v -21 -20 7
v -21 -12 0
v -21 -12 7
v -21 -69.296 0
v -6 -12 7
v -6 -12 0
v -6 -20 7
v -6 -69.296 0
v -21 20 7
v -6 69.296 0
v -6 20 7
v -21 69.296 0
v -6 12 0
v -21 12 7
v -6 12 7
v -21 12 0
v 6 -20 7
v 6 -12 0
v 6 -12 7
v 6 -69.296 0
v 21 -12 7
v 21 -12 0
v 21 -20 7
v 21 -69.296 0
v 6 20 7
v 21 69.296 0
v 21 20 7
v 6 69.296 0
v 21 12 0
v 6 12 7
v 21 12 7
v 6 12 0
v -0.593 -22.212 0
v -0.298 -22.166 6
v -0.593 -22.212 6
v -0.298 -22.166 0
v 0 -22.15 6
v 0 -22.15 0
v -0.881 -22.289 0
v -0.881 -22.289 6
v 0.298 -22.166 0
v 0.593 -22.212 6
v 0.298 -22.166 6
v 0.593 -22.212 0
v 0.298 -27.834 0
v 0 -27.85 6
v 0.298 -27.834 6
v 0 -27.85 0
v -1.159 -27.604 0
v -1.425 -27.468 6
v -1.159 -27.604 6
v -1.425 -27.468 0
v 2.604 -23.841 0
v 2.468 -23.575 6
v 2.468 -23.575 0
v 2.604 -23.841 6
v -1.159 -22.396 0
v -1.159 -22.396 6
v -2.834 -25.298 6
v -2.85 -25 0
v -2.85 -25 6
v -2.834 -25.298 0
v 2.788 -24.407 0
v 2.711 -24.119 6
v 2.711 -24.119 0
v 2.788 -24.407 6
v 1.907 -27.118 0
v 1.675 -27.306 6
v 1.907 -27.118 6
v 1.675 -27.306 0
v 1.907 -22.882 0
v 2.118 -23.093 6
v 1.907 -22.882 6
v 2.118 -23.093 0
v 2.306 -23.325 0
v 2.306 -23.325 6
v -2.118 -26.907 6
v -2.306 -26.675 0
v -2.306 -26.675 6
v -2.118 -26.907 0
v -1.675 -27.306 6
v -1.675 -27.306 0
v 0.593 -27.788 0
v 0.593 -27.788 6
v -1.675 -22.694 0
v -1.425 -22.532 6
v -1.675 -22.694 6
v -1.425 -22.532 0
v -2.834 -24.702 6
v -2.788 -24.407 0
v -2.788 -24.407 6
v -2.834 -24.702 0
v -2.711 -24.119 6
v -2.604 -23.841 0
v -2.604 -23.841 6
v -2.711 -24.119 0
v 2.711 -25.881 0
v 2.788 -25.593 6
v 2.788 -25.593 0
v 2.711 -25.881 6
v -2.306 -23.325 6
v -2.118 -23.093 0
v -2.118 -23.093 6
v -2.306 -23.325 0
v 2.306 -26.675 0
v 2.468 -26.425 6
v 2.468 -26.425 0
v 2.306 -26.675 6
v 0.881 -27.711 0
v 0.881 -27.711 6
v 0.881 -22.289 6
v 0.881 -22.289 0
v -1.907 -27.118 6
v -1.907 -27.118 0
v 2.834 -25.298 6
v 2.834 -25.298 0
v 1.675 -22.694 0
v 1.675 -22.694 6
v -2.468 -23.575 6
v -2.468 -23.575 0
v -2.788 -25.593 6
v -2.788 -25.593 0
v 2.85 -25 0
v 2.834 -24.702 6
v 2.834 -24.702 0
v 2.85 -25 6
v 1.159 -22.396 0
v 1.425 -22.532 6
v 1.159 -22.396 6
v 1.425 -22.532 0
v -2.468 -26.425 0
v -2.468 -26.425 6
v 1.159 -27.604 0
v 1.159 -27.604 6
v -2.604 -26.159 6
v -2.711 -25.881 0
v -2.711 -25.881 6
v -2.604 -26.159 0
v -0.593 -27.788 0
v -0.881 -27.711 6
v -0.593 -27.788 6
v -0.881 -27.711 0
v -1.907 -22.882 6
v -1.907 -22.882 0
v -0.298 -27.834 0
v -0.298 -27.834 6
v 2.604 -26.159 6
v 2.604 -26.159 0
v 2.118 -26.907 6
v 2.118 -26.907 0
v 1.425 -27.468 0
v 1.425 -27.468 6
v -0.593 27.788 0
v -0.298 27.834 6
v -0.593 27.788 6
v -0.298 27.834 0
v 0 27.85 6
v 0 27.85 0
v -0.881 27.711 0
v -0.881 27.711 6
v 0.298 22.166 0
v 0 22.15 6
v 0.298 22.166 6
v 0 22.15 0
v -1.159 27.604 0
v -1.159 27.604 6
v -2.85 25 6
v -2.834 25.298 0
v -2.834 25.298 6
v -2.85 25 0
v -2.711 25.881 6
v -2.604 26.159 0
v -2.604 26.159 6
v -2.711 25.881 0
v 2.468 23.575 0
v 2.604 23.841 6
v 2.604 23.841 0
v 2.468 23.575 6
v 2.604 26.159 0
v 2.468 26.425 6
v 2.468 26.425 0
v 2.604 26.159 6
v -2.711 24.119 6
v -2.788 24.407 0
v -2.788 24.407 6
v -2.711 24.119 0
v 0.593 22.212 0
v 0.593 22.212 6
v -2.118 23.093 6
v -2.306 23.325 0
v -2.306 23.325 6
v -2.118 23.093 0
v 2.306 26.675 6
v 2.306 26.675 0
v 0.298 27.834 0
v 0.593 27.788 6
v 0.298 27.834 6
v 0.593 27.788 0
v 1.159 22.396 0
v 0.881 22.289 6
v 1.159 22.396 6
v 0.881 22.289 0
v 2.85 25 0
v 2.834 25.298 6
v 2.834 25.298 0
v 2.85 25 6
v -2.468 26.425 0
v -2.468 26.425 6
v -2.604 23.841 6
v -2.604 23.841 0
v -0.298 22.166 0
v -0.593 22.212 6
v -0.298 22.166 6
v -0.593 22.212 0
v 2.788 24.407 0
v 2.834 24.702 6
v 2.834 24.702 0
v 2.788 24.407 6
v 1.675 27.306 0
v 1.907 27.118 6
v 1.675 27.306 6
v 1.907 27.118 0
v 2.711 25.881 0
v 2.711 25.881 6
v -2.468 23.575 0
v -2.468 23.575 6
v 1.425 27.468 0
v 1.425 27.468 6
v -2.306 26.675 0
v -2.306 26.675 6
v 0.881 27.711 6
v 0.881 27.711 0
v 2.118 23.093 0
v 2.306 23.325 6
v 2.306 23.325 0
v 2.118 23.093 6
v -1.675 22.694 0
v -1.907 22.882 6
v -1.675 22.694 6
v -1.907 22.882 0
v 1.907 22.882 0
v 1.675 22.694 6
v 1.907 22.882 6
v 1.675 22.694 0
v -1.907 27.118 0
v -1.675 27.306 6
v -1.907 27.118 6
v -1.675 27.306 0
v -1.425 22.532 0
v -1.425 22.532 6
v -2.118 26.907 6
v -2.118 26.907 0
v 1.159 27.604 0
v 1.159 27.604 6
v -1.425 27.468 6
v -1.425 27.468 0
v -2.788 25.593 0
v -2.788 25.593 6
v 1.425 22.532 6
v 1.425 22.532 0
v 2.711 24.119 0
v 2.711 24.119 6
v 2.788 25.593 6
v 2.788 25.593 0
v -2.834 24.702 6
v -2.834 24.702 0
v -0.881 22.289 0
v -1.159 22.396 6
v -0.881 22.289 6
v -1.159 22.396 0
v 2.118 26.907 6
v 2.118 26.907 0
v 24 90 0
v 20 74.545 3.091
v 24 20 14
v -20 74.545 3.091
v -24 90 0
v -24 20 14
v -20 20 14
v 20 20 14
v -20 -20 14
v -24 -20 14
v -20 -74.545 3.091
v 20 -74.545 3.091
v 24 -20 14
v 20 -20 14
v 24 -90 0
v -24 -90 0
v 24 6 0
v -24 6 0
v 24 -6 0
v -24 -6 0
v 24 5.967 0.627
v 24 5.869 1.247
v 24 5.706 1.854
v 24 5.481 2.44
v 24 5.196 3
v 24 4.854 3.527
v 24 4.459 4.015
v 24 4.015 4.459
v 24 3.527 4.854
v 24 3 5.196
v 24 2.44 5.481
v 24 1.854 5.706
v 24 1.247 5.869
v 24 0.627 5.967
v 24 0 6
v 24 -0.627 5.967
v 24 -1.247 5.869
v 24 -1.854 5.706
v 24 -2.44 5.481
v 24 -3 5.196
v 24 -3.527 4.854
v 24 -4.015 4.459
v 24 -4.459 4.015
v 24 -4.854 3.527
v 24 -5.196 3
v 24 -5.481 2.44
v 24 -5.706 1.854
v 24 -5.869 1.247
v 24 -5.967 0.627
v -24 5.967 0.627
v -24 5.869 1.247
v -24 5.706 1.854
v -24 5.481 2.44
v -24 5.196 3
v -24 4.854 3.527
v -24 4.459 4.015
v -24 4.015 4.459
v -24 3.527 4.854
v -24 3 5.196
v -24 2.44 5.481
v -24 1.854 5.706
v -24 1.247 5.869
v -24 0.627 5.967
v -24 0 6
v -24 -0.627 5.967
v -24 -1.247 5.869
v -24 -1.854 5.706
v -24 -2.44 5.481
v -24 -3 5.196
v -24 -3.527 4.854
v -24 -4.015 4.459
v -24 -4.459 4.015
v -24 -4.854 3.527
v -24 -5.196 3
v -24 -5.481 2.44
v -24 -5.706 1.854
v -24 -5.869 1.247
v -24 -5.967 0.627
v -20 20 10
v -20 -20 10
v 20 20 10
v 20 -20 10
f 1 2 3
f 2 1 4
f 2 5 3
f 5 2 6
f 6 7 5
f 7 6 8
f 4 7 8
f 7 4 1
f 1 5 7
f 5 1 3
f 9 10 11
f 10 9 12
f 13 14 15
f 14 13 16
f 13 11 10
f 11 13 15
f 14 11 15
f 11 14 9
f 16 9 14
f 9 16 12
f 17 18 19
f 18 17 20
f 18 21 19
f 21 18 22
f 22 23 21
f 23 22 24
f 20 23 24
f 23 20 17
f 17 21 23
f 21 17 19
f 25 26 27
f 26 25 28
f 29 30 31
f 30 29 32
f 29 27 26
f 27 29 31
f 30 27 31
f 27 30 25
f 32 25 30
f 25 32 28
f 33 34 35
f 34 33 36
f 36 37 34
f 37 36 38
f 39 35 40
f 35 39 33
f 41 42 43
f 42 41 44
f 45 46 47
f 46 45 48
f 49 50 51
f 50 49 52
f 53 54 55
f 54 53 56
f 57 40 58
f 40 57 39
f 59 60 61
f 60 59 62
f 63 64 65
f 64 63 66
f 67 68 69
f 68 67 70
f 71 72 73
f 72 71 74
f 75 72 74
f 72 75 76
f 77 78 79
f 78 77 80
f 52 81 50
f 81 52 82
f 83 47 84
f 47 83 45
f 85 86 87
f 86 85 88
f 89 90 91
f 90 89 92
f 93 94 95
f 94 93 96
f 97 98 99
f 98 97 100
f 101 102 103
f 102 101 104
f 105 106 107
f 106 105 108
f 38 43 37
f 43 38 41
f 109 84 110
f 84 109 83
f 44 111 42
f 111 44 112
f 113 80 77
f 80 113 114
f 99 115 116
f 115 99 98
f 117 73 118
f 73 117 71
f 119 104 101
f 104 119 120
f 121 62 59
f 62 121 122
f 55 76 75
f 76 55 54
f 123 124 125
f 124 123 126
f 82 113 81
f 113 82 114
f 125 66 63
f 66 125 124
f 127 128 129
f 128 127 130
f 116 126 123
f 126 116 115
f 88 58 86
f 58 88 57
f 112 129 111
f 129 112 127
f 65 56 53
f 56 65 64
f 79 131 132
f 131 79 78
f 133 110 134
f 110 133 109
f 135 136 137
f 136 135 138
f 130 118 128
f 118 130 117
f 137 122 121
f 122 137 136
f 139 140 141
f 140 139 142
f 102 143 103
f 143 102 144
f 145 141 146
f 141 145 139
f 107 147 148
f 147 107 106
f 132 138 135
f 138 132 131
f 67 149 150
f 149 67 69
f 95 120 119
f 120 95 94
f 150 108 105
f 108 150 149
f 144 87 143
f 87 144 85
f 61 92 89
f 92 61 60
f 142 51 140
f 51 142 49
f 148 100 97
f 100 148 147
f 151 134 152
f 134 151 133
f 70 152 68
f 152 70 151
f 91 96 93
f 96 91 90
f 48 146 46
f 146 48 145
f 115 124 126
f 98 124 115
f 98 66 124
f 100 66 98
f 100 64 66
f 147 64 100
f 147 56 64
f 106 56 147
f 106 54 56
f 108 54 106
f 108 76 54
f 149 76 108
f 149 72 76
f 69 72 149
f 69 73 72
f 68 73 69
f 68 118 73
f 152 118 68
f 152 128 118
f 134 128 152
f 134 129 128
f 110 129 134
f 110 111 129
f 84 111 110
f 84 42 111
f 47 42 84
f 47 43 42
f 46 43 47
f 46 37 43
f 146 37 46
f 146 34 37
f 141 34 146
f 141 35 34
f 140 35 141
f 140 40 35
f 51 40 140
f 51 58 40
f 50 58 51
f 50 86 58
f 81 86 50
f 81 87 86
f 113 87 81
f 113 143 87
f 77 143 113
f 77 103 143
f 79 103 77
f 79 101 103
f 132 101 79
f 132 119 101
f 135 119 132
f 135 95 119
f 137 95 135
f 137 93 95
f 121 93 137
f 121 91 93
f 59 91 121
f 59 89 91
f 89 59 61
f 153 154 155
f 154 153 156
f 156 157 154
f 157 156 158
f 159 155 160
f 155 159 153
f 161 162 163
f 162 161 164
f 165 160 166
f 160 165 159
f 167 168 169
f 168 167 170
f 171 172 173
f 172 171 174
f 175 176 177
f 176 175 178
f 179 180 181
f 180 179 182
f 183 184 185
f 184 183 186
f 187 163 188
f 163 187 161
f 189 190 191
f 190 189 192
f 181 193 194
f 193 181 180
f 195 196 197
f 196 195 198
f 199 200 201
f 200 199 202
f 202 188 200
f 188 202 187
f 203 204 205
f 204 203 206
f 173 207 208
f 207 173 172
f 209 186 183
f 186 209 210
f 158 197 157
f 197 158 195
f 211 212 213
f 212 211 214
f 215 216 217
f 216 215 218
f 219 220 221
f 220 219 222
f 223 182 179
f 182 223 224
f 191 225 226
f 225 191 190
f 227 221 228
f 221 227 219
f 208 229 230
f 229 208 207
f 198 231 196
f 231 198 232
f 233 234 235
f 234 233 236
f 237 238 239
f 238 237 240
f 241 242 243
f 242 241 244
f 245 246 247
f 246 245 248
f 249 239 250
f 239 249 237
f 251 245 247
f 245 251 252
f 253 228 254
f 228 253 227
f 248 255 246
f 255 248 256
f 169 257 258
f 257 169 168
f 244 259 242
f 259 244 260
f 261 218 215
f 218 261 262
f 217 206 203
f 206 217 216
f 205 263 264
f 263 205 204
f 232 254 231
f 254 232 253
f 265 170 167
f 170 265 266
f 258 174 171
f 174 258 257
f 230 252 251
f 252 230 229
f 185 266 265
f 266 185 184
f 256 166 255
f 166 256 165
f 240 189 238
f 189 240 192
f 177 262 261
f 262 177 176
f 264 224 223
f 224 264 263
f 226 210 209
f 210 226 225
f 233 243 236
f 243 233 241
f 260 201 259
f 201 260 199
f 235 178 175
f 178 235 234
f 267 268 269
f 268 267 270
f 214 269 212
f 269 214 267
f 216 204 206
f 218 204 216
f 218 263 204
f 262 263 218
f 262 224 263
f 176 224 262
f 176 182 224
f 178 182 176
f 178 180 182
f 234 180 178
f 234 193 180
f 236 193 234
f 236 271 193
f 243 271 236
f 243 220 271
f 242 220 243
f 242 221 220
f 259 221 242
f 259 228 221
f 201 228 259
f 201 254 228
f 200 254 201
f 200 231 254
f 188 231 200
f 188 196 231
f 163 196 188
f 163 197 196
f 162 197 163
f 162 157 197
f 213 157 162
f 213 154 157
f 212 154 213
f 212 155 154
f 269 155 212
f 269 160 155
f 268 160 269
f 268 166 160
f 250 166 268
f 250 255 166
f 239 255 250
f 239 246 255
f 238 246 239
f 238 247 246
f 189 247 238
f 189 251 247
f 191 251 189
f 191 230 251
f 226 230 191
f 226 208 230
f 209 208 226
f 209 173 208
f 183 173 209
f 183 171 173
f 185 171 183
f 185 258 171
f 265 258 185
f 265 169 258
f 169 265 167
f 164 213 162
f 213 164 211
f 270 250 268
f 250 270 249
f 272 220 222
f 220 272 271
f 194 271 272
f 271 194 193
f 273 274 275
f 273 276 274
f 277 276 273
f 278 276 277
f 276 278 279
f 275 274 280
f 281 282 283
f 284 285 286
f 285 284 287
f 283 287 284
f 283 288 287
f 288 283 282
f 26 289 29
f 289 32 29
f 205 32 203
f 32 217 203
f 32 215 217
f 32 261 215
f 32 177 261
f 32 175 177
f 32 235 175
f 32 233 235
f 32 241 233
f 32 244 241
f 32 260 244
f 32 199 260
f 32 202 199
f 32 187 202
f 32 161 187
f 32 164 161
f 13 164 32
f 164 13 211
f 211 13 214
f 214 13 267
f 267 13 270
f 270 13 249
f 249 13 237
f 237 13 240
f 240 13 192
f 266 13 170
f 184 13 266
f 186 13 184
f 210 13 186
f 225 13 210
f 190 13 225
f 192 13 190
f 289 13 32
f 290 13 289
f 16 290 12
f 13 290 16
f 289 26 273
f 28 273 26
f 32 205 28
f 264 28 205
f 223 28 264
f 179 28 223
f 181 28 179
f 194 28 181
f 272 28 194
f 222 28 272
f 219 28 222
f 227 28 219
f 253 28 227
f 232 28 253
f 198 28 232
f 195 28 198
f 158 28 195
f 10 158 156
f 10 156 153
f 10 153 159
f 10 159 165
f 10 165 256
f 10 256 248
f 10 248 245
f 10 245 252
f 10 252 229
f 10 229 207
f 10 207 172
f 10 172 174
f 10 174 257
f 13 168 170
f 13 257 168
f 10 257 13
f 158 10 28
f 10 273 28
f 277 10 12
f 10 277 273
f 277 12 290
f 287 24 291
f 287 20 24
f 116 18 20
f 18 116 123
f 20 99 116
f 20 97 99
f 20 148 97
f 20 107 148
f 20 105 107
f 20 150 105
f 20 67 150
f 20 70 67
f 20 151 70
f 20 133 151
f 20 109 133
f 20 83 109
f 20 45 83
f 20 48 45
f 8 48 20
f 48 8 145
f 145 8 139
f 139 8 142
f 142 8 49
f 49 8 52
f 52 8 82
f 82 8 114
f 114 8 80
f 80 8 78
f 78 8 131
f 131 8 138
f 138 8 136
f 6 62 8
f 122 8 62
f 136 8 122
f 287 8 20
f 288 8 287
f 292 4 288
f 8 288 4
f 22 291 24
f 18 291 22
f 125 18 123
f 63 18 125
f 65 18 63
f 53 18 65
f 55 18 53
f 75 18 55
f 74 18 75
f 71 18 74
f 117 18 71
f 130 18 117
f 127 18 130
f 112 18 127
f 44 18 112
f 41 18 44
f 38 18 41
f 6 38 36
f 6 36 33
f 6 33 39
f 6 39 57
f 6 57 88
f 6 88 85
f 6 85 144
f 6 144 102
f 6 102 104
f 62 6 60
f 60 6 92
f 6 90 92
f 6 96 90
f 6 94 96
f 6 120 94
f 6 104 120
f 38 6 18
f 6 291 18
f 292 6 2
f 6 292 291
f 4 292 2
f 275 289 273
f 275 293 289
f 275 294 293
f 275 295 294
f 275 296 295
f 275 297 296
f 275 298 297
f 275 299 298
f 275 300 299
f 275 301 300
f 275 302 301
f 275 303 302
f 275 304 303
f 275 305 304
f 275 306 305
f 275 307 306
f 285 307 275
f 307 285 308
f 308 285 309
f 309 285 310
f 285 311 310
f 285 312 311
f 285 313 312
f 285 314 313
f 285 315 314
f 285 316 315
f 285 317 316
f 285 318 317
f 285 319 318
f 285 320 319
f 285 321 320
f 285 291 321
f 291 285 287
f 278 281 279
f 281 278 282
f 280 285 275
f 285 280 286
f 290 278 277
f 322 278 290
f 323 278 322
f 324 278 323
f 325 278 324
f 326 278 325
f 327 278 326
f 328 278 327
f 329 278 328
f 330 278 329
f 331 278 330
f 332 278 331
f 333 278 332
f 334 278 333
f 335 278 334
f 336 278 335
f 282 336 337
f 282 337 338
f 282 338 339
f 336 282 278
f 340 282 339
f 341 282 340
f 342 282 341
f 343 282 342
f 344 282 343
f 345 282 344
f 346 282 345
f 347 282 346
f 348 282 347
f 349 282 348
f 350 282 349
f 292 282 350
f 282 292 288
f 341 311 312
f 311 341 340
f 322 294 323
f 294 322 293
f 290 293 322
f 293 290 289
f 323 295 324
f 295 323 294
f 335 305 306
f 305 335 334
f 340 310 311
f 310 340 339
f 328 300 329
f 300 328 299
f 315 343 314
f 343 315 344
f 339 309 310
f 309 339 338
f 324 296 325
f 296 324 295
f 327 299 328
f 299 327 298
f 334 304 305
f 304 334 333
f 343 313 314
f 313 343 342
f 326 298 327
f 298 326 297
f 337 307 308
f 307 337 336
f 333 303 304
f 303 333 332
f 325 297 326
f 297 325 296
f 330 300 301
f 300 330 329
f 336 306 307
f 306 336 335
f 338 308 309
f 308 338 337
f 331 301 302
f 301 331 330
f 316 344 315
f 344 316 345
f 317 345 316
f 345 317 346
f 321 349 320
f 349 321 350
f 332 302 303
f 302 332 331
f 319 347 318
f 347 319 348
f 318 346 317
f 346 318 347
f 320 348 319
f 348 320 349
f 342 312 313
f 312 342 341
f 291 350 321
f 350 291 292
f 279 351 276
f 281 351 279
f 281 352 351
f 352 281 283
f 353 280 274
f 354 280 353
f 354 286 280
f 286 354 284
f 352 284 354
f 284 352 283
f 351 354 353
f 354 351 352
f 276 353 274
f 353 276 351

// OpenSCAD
// Modular Wind-Up Mini Golf System
// PART 3: Bridge Obstacle

/* [Core Tolerances] */
tile_thickness = 8;
peg_diameter = 5.5; 

$fn = 60; 

// ==========================================
// RENDER SELECTION
// ==========================================
bridge_obstacle();

// ==========================================
// BRIDGE OBSTACLE MODULE
// ==========================================

module bridge_obstacle() {
  // Bridge geometry
  bridge_len = 180;  // Length remains 180mm to maximize slope length
  path_w = 40;       // Path width for the golf ball
  rail_w = 4;        // Width of guard rails on each side
  total_w = path_w + 2 * rail_w; // Total width: 48mm
  deck_h = 10;       // Reduced deck height to 10mm for a incredibly gentle and smooth roll-over!
  rail_h = 4;        // Height of rails above deck surface
  
  // Tolerances
  c_hole = 0.2;      // Tolerance for connector peg holes

  // Reorient the entire assembly so:
  // - The bridge length is along the Y-axis (north-south track flow)
  // - The bridge width is along the X-axis (east-west)
  // - The height goes vertically along the Z-axis
  rotate([90, 0, 90]) {
    difference() {
      // ----------------------------------------------------
      // 1. SOLID BRIDGE FOUNDATION (manifold base)
      // ----------------------------------------------------
      linear_extrude(height=total_w, center=true)
        polygon([
          [-bridge_len/2, 0],
          [-20, deck_h + rail_h],
          [20, deck_h + rail_h],
          [bridge_len/2, 0]
        ]);
      
      // ----------------------------------------------------
      // 2. SUBTRACTIONS & CUTOUTS
      // ----------------------------------------------------
      
      // A. The flat bottom tunnel arch underneath the bridge
      cylinder(h=total_w + 2, r=6, center=true);
      
      // B. The recessed ball rolling path of width path_w
      linear_extrude(height=path_w, center=true)
        polygon([
          [-(bridge_len/2 + 5), 0.5],
          [-20, deck_h],
          [20, deck_h],
          [(bridge_len/2 + 5), 0.5],
          [(bridge_len/2 + 5), deck_h + rail_h + 10],
          [-(bridge_len/2 + 5), deck_h + rail_h + 10]
        ]);
      
      // C. 3D Printing Material Relief Pockets (Hollowed Underside)
      // - Removes unnecessary plastic to save ~50% filament and printing time.
      // - Leaves 3mm thick outer side walls and a 3mm thick walkway floor.
      // - Leaves a solid 12mm central spine (rib) along z = 0 to house the peg holes securely.
      // - No supports needed since the ceiling slopes gently at a printable angle.
      for (z_offset = [-13.5, 13.5]) {
        // Left ramp relief pockets (from x = -70 to x = -12)
        translate([0, 0, z_offset])
          linear_extrude(height=15, center=true)
            polygon([
              [-70, -0.1],
              [-20, deck_h - 3],
              [-12, deck_h - 3],
              [-12, -0.1]
            ]);
        
        // Right ramp relief pockets (from x = 12 to x = 70)
        translate([0, 0, z_offset])
          linear_extrude(height=15, center=true)
            polygon([
              [12, -0.1],
              [12, deck_h - 3],
              [20, deck_h - 3],
              [70, -0.1]
            ]);
      }
      
      // D. Pegboard Connector Holes (on flat bottom along centerline)
      // - Placed at x = -25 and x = 25 in bridge space (translates to y = -25 and y = 25 in tile space)
      // - Fully enclosed by the 12mm central spine, leaving 3.15mm of solid wall on all sides!
      for (x_pos = [-25, 25]) {
        translate([x_pos, -0.1, 0])
          rotate([-90, 0, 0])
            cylinder(h=6.1, d=peg_diameter + c_hole);
      }
    }
  }
}
